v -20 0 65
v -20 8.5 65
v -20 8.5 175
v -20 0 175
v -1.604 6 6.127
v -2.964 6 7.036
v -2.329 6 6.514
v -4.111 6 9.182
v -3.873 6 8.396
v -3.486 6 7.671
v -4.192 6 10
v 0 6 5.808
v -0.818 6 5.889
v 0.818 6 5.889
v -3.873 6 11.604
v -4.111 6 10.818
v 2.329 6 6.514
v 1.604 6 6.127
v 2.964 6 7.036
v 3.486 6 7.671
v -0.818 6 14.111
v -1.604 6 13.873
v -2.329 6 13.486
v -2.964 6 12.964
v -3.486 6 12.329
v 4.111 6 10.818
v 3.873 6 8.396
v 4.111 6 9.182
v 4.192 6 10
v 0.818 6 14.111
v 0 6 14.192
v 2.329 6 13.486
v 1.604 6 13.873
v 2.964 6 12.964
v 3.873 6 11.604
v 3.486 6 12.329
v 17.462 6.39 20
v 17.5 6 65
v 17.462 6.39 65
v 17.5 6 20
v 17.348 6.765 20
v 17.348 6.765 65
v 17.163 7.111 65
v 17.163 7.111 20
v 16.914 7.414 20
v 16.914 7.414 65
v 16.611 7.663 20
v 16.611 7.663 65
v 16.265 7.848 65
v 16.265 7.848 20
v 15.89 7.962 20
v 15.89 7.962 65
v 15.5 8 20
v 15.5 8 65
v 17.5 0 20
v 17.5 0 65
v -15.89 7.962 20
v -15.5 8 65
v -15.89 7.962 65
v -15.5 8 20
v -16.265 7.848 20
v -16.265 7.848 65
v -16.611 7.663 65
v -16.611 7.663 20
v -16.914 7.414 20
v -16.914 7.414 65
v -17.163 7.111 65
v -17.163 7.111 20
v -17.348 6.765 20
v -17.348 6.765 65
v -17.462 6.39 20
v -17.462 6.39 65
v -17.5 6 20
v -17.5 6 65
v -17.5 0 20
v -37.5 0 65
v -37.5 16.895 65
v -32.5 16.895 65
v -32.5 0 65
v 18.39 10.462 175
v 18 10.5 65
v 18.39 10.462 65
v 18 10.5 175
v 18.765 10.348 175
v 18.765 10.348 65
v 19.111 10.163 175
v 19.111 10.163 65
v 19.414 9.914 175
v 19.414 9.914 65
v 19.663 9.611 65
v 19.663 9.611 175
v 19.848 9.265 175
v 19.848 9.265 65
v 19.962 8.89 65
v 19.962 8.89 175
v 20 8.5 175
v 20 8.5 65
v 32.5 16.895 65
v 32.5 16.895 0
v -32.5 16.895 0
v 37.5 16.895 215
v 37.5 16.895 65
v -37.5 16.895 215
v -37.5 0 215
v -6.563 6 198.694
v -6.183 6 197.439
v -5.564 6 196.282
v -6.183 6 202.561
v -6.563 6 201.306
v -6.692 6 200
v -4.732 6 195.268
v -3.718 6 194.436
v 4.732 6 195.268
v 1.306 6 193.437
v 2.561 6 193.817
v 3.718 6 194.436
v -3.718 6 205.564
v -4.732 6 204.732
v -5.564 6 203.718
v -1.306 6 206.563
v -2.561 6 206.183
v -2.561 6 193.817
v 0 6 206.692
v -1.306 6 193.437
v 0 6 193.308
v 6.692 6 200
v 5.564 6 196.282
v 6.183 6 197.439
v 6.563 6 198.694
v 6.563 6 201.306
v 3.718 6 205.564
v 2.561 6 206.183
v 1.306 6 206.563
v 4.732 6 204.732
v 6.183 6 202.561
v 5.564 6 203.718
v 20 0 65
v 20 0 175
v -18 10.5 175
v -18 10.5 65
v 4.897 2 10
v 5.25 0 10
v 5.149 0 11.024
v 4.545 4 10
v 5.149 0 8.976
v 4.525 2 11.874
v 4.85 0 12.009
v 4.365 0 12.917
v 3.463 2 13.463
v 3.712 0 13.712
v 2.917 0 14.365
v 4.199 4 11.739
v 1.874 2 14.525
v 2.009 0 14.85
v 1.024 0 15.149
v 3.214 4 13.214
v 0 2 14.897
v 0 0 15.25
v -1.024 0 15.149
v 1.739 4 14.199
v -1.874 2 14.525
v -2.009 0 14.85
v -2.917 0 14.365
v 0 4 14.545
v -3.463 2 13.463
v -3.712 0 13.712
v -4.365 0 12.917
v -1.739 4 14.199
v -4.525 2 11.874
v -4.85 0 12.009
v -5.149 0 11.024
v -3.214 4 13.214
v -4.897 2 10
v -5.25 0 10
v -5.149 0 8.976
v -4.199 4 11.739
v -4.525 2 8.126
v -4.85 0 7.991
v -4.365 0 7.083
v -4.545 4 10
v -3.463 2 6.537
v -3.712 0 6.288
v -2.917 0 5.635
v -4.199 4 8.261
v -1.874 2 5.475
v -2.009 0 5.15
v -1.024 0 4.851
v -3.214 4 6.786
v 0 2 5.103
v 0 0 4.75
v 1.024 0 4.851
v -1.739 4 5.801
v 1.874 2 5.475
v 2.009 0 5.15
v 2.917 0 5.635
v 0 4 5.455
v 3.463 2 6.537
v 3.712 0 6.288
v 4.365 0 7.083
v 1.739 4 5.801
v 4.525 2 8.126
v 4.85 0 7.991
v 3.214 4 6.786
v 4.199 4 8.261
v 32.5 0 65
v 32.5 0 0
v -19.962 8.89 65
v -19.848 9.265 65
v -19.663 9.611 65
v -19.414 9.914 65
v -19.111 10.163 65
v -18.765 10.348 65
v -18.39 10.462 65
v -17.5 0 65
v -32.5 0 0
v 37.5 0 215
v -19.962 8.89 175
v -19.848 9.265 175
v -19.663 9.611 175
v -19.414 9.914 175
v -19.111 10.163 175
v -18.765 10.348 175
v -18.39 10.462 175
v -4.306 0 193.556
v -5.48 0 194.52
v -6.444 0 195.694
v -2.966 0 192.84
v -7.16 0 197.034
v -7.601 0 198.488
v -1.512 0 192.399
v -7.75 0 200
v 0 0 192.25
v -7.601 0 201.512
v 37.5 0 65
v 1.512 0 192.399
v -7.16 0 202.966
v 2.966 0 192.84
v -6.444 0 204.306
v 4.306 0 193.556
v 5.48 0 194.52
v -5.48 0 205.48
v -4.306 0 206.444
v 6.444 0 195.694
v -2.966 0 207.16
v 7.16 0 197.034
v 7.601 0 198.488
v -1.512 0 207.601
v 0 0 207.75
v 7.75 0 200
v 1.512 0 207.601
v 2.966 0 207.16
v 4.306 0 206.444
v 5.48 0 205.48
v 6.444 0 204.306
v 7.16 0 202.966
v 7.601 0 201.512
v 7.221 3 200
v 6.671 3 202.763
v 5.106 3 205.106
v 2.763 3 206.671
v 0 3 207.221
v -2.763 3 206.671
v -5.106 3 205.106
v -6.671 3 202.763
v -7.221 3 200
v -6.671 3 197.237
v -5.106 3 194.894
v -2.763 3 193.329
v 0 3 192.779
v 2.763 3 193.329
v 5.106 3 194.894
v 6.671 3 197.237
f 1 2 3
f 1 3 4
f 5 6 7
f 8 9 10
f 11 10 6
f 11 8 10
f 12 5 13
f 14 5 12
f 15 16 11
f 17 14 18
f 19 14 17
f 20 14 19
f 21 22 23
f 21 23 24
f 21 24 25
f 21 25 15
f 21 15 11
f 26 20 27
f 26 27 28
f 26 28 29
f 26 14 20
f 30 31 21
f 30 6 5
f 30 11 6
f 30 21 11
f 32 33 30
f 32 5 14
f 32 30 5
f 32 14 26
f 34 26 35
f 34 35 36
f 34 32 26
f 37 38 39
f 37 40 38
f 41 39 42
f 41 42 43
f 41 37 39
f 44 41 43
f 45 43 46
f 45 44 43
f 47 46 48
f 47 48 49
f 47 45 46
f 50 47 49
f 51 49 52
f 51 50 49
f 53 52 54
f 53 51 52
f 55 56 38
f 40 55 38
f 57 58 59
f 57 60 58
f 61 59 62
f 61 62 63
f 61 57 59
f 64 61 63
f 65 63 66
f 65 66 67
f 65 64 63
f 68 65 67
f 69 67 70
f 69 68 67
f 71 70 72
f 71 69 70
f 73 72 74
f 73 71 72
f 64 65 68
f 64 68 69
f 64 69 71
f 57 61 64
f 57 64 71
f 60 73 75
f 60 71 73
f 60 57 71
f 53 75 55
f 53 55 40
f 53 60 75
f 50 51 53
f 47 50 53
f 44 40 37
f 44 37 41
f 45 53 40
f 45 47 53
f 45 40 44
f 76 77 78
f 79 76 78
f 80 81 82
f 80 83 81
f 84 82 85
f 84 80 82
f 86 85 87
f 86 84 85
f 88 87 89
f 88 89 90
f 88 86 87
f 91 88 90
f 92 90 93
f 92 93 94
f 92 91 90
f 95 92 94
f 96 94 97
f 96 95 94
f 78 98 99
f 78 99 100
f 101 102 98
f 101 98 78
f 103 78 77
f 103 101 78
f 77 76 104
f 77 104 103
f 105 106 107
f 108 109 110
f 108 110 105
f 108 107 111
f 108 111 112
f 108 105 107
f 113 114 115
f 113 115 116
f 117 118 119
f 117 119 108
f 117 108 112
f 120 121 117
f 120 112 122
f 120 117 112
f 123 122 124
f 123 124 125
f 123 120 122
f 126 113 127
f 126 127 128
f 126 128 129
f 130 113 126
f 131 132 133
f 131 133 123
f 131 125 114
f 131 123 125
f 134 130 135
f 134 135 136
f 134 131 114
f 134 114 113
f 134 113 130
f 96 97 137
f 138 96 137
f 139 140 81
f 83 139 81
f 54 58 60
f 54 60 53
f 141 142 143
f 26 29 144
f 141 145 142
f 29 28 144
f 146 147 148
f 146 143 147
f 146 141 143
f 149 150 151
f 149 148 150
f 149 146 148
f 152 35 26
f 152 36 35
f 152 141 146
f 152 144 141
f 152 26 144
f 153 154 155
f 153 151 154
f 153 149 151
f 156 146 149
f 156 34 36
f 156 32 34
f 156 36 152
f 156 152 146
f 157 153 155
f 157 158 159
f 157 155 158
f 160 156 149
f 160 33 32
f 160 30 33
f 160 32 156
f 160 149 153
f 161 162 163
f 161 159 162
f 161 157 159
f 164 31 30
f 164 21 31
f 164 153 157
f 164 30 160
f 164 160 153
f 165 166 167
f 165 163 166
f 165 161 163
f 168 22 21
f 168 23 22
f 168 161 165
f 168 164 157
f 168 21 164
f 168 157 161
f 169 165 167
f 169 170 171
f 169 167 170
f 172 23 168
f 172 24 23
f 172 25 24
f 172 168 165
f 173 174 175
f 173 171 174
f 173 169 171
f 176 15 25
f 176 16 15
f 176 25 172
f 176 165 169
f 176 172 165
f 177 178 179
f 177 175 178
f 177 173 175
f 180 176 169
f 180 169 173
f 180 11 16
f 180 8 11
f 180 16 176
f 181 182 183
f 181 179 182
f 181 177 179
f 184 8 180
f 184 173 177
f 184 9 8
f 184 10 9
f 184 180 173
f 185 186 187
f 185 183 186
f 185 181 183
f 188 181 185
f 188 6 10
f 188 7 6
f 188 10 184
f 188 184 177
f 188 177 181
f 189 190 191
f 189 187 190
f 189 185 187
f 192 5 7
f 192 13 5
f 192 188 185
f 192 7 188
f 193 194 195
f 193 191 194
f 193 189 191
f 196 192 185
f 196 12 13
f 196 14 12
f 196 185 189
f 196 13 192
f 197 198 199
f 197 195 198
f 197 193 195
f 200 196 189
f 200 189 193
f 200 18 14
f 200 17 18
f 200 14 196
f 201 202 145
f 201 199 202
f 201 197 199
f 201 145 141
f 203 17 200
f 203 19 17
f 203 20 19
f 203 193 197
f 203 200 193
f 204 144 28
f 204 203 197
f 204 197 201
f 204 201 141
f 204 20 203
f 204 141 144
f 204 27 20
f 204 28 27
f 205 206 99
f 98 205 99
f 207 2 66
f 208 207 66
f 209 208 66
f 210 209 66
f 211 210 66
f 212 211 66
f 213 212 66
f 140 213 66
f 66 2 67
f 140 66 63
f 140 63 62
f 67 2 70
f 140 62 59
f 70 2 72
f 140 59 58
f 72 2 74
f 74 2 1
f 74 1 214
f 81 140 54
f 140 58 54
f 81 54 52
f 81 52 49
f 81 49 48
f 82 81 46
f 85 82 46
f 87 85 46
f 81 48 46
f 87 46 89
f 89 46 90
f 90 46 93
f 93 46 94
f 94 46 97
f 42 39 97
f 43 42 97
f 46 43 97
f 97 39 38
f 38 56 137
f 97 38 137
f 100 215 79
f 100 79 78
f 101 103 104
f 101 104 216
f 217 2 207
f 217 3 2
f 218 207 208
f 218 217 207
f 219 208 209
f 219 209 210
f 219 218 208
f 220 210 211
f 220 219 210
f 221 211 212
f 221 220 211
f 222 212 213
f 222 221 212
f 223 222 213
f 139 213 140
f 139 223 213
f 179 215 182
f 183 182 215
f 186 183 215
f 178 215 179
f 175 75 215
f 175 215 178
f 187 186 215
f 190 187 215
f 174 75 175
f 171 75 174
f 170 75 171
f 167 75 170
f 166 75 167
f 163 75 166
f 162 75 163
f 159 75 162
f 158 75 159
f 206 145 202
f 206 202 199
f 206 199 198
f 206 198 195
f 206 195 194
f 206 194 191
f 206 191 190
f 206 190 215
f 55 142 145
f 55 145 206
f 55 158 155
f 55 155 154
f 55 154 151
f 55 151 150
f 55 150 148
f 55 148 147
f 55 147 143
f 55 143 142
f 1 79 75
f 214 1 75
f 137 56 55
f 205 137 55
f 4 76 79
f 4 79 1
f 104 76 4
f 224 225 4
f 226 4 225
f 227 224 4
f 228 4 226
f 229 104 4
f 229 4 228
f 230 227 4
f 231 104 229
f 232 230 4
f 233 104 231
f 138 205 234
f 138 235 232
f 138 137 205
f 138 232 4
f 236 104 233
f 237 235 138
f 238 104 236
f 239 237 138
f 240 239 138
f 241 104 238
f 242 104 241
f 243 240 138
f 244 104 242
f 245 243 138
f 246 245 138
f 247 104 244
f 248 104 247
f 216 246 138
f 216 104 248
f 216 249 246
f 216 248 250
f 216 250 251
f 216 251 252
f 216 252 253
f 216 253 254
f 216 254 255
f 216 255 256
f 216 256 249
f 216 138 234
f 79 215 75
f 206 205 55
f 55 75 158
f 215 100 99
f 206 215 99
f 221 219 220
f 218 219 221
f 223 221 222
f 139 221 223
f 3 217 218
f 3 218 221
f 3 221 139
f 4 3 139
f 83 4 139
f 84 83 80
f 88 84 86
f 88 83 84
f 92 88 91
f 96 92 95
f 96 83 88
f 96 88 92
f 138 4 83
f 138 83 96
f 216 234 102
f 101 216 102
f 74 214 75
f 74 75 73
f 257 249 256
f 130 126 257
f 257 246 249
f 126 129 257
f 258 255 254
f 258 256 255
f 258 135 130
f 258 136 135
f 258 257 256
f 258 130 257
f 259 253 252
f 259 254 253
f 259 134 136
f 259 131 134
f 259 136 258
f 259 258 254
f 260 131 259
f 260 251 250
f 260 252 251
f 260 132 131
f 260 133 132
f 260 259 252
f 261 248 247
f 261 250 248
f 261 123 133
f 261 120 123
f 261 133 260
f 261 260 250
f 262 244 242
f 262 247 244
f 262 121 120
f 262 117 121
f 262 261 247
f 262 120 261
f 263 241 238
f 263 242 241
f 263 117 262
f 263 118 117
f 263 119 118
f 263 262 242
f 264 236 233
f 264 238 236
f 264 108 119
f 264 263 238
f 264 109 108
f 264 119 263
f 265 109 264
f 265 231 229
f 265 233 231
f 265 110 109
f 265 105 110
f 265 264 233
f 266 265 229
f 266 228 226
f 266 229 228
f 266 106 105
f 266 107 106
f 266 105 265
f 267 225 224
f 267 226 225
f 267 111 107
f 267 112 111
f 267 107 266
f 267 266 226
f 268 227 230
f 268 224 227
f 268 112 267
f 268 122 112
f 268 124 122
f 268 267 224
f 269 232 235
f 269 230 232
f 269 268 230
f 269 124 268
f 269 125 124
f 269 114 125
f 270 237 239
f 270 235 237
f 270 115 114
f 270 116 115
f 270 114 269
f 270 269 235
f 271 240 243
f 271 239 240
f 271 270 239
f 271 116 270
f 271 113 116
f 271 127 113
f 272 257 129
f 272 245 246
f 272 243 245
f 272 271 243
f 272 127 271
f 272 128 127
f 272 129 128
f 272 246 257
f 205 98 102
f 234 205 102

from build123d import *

# Parameters (mm, degrees)
F0_W       = 65
F0_H       = 46
F1_DEPTH   = 65
F2_W       = 35
F2_H       = 16
F3_DEPTH   = 45
F4_R       = 2
F5_W       = 75
F5_H       = 53.7899285555
F6_DEPTH   = 150
F7_W       = 40
F7_H       = 21
F8_DEPTH   = 110
F9_R       = 2
F10_R      = 2
F11_R      = 2
F12_W      = 150.7326364517
F12_H      = 343.7213376164
F6_FACE1_W = 75
F6_FACE1_H = 150
F1_FACE1_W = 65
F1_FACE1_H = 65
F13_DEPTH  = 26.8959642777
F14_R      = 7.75
F14_R_2    = 5.25
F15_DEPTH  = 6
F15_TAPER  = 10
F16_W      = 143.152281642
F16_H      = 267.6325216889
F17_DEPTH  = 10


with BuildPart() as f1:
    # F0 (on Top) → F1 (new body)
    with BuildSketch(Plane.XY):
        Rectangle(F0_W, F0_H)
    extrude(amount=F1_DEPTH)

    # F2 (on face) → F3 (cut)
    with BuildSketch(Plane.XY.offset(65)):
        Rectangle(F2_W, F2_H)
    extrude(amount=-F3_DEPTH, mode=Mode.SUBTRACT)

    # F4
    f4_edges = [f1.edges().sort_by_distance(p)[0] for p in [
        (-17.5, -8, 42.5),
        (-17.5, 8, 42.5),
        (17.5, -8, 42.5),
        (17.5, 8, 42.5),
    ]]
    fillet(f4_edges, radius=F4_R)

    # F5 (on face) → F6 (join)
    with BuildSketch(Plane.XY.offset(65)):
        Rectangle(F5_W, F5_H)
    extrude(amount=F6_DEPTH)

    # F7 (on face) → F8 (cut)
    with BuildSketch(Plane(origin=(0, 0, 65), x_dir=(1, 0, 0), z_dir=(0, 0, -1))):
        Rectangle(F7_W, F7_H)
    extrude(amount=-F8_DEPTH, mode=Mode.SUBTRACT)

    # F9
    f9_edges = [f1.edges().sort_by_distance(p)[0] for p in [
        (-20, -10.5, 120),
    ]]
    fillet(f9_edges, radius=F9_R)

    # F10
    f10_edges = [f1.edges().sort_by_distance(p)[0] for p in [
        (-20, 10.5, 120),
    ]]
    fillet(f10_edges, radius=F10_R)

    # F11
    f11_edges = [f1.edges().sort_by_distance(p)[0] for p in [
        (20, -10.5, 120),
        (20, 10.5, 120),
    ]]
    fillet(f11_edges, radius=F11_R)

    # F12 (on Front) + F6_face1 (on face) + F1_face1 (on face) → F13 (cut, through all)
    with BuildSketch(Plane.XZ):
        with Locations((0, 126.5255063772)):
            Rectangle(F12_W, F12_H)
    with BuildSketch(Plane(origin=(0, -26.8949642777, 140), x_dir=(1, 0, 0), z_dir=(0, -1, 0))):
        Rectangle(F6_FACE1_W, F6_FACE1_H)
    with BuildSketch(Plane(origin=(0, -23, 32.5), x_dir=(1, 0, 0), z_dir=(0, -1, 0))):
        Rectangle(F1_FACE1_W, F1_FACE1_H)
    extrude(amount=F13_DEPTH, mode=Mode.SUBTRACT)

    # F14 (on face) → F15 (cut)
    with BuildSketch(Plane.XZ):
        with Locations((0, 200)):
            Circle(F14_R)
        with Locations((0, 10)):
            Circle(F14_R_2)
    extrude(amount=-F15_DEPTH, taper=F15_TAPER, mode=Mode.SUBTRACT)

    # F16 (on face) → F17 (cut)
    with BuildSketch(Plane(origin=(0, 26.8949642777, 0), x_dir=(-1, 0, 0), z_dir=(0, 1, 0))):
        with Locations((18.2788968086, 90.5453972518)):
            Rectangle(F16_W, F16_H)
    extrude(amount=-F17_DEPTH, mode=Mode.SUBTRACT)


solid = f1.part
